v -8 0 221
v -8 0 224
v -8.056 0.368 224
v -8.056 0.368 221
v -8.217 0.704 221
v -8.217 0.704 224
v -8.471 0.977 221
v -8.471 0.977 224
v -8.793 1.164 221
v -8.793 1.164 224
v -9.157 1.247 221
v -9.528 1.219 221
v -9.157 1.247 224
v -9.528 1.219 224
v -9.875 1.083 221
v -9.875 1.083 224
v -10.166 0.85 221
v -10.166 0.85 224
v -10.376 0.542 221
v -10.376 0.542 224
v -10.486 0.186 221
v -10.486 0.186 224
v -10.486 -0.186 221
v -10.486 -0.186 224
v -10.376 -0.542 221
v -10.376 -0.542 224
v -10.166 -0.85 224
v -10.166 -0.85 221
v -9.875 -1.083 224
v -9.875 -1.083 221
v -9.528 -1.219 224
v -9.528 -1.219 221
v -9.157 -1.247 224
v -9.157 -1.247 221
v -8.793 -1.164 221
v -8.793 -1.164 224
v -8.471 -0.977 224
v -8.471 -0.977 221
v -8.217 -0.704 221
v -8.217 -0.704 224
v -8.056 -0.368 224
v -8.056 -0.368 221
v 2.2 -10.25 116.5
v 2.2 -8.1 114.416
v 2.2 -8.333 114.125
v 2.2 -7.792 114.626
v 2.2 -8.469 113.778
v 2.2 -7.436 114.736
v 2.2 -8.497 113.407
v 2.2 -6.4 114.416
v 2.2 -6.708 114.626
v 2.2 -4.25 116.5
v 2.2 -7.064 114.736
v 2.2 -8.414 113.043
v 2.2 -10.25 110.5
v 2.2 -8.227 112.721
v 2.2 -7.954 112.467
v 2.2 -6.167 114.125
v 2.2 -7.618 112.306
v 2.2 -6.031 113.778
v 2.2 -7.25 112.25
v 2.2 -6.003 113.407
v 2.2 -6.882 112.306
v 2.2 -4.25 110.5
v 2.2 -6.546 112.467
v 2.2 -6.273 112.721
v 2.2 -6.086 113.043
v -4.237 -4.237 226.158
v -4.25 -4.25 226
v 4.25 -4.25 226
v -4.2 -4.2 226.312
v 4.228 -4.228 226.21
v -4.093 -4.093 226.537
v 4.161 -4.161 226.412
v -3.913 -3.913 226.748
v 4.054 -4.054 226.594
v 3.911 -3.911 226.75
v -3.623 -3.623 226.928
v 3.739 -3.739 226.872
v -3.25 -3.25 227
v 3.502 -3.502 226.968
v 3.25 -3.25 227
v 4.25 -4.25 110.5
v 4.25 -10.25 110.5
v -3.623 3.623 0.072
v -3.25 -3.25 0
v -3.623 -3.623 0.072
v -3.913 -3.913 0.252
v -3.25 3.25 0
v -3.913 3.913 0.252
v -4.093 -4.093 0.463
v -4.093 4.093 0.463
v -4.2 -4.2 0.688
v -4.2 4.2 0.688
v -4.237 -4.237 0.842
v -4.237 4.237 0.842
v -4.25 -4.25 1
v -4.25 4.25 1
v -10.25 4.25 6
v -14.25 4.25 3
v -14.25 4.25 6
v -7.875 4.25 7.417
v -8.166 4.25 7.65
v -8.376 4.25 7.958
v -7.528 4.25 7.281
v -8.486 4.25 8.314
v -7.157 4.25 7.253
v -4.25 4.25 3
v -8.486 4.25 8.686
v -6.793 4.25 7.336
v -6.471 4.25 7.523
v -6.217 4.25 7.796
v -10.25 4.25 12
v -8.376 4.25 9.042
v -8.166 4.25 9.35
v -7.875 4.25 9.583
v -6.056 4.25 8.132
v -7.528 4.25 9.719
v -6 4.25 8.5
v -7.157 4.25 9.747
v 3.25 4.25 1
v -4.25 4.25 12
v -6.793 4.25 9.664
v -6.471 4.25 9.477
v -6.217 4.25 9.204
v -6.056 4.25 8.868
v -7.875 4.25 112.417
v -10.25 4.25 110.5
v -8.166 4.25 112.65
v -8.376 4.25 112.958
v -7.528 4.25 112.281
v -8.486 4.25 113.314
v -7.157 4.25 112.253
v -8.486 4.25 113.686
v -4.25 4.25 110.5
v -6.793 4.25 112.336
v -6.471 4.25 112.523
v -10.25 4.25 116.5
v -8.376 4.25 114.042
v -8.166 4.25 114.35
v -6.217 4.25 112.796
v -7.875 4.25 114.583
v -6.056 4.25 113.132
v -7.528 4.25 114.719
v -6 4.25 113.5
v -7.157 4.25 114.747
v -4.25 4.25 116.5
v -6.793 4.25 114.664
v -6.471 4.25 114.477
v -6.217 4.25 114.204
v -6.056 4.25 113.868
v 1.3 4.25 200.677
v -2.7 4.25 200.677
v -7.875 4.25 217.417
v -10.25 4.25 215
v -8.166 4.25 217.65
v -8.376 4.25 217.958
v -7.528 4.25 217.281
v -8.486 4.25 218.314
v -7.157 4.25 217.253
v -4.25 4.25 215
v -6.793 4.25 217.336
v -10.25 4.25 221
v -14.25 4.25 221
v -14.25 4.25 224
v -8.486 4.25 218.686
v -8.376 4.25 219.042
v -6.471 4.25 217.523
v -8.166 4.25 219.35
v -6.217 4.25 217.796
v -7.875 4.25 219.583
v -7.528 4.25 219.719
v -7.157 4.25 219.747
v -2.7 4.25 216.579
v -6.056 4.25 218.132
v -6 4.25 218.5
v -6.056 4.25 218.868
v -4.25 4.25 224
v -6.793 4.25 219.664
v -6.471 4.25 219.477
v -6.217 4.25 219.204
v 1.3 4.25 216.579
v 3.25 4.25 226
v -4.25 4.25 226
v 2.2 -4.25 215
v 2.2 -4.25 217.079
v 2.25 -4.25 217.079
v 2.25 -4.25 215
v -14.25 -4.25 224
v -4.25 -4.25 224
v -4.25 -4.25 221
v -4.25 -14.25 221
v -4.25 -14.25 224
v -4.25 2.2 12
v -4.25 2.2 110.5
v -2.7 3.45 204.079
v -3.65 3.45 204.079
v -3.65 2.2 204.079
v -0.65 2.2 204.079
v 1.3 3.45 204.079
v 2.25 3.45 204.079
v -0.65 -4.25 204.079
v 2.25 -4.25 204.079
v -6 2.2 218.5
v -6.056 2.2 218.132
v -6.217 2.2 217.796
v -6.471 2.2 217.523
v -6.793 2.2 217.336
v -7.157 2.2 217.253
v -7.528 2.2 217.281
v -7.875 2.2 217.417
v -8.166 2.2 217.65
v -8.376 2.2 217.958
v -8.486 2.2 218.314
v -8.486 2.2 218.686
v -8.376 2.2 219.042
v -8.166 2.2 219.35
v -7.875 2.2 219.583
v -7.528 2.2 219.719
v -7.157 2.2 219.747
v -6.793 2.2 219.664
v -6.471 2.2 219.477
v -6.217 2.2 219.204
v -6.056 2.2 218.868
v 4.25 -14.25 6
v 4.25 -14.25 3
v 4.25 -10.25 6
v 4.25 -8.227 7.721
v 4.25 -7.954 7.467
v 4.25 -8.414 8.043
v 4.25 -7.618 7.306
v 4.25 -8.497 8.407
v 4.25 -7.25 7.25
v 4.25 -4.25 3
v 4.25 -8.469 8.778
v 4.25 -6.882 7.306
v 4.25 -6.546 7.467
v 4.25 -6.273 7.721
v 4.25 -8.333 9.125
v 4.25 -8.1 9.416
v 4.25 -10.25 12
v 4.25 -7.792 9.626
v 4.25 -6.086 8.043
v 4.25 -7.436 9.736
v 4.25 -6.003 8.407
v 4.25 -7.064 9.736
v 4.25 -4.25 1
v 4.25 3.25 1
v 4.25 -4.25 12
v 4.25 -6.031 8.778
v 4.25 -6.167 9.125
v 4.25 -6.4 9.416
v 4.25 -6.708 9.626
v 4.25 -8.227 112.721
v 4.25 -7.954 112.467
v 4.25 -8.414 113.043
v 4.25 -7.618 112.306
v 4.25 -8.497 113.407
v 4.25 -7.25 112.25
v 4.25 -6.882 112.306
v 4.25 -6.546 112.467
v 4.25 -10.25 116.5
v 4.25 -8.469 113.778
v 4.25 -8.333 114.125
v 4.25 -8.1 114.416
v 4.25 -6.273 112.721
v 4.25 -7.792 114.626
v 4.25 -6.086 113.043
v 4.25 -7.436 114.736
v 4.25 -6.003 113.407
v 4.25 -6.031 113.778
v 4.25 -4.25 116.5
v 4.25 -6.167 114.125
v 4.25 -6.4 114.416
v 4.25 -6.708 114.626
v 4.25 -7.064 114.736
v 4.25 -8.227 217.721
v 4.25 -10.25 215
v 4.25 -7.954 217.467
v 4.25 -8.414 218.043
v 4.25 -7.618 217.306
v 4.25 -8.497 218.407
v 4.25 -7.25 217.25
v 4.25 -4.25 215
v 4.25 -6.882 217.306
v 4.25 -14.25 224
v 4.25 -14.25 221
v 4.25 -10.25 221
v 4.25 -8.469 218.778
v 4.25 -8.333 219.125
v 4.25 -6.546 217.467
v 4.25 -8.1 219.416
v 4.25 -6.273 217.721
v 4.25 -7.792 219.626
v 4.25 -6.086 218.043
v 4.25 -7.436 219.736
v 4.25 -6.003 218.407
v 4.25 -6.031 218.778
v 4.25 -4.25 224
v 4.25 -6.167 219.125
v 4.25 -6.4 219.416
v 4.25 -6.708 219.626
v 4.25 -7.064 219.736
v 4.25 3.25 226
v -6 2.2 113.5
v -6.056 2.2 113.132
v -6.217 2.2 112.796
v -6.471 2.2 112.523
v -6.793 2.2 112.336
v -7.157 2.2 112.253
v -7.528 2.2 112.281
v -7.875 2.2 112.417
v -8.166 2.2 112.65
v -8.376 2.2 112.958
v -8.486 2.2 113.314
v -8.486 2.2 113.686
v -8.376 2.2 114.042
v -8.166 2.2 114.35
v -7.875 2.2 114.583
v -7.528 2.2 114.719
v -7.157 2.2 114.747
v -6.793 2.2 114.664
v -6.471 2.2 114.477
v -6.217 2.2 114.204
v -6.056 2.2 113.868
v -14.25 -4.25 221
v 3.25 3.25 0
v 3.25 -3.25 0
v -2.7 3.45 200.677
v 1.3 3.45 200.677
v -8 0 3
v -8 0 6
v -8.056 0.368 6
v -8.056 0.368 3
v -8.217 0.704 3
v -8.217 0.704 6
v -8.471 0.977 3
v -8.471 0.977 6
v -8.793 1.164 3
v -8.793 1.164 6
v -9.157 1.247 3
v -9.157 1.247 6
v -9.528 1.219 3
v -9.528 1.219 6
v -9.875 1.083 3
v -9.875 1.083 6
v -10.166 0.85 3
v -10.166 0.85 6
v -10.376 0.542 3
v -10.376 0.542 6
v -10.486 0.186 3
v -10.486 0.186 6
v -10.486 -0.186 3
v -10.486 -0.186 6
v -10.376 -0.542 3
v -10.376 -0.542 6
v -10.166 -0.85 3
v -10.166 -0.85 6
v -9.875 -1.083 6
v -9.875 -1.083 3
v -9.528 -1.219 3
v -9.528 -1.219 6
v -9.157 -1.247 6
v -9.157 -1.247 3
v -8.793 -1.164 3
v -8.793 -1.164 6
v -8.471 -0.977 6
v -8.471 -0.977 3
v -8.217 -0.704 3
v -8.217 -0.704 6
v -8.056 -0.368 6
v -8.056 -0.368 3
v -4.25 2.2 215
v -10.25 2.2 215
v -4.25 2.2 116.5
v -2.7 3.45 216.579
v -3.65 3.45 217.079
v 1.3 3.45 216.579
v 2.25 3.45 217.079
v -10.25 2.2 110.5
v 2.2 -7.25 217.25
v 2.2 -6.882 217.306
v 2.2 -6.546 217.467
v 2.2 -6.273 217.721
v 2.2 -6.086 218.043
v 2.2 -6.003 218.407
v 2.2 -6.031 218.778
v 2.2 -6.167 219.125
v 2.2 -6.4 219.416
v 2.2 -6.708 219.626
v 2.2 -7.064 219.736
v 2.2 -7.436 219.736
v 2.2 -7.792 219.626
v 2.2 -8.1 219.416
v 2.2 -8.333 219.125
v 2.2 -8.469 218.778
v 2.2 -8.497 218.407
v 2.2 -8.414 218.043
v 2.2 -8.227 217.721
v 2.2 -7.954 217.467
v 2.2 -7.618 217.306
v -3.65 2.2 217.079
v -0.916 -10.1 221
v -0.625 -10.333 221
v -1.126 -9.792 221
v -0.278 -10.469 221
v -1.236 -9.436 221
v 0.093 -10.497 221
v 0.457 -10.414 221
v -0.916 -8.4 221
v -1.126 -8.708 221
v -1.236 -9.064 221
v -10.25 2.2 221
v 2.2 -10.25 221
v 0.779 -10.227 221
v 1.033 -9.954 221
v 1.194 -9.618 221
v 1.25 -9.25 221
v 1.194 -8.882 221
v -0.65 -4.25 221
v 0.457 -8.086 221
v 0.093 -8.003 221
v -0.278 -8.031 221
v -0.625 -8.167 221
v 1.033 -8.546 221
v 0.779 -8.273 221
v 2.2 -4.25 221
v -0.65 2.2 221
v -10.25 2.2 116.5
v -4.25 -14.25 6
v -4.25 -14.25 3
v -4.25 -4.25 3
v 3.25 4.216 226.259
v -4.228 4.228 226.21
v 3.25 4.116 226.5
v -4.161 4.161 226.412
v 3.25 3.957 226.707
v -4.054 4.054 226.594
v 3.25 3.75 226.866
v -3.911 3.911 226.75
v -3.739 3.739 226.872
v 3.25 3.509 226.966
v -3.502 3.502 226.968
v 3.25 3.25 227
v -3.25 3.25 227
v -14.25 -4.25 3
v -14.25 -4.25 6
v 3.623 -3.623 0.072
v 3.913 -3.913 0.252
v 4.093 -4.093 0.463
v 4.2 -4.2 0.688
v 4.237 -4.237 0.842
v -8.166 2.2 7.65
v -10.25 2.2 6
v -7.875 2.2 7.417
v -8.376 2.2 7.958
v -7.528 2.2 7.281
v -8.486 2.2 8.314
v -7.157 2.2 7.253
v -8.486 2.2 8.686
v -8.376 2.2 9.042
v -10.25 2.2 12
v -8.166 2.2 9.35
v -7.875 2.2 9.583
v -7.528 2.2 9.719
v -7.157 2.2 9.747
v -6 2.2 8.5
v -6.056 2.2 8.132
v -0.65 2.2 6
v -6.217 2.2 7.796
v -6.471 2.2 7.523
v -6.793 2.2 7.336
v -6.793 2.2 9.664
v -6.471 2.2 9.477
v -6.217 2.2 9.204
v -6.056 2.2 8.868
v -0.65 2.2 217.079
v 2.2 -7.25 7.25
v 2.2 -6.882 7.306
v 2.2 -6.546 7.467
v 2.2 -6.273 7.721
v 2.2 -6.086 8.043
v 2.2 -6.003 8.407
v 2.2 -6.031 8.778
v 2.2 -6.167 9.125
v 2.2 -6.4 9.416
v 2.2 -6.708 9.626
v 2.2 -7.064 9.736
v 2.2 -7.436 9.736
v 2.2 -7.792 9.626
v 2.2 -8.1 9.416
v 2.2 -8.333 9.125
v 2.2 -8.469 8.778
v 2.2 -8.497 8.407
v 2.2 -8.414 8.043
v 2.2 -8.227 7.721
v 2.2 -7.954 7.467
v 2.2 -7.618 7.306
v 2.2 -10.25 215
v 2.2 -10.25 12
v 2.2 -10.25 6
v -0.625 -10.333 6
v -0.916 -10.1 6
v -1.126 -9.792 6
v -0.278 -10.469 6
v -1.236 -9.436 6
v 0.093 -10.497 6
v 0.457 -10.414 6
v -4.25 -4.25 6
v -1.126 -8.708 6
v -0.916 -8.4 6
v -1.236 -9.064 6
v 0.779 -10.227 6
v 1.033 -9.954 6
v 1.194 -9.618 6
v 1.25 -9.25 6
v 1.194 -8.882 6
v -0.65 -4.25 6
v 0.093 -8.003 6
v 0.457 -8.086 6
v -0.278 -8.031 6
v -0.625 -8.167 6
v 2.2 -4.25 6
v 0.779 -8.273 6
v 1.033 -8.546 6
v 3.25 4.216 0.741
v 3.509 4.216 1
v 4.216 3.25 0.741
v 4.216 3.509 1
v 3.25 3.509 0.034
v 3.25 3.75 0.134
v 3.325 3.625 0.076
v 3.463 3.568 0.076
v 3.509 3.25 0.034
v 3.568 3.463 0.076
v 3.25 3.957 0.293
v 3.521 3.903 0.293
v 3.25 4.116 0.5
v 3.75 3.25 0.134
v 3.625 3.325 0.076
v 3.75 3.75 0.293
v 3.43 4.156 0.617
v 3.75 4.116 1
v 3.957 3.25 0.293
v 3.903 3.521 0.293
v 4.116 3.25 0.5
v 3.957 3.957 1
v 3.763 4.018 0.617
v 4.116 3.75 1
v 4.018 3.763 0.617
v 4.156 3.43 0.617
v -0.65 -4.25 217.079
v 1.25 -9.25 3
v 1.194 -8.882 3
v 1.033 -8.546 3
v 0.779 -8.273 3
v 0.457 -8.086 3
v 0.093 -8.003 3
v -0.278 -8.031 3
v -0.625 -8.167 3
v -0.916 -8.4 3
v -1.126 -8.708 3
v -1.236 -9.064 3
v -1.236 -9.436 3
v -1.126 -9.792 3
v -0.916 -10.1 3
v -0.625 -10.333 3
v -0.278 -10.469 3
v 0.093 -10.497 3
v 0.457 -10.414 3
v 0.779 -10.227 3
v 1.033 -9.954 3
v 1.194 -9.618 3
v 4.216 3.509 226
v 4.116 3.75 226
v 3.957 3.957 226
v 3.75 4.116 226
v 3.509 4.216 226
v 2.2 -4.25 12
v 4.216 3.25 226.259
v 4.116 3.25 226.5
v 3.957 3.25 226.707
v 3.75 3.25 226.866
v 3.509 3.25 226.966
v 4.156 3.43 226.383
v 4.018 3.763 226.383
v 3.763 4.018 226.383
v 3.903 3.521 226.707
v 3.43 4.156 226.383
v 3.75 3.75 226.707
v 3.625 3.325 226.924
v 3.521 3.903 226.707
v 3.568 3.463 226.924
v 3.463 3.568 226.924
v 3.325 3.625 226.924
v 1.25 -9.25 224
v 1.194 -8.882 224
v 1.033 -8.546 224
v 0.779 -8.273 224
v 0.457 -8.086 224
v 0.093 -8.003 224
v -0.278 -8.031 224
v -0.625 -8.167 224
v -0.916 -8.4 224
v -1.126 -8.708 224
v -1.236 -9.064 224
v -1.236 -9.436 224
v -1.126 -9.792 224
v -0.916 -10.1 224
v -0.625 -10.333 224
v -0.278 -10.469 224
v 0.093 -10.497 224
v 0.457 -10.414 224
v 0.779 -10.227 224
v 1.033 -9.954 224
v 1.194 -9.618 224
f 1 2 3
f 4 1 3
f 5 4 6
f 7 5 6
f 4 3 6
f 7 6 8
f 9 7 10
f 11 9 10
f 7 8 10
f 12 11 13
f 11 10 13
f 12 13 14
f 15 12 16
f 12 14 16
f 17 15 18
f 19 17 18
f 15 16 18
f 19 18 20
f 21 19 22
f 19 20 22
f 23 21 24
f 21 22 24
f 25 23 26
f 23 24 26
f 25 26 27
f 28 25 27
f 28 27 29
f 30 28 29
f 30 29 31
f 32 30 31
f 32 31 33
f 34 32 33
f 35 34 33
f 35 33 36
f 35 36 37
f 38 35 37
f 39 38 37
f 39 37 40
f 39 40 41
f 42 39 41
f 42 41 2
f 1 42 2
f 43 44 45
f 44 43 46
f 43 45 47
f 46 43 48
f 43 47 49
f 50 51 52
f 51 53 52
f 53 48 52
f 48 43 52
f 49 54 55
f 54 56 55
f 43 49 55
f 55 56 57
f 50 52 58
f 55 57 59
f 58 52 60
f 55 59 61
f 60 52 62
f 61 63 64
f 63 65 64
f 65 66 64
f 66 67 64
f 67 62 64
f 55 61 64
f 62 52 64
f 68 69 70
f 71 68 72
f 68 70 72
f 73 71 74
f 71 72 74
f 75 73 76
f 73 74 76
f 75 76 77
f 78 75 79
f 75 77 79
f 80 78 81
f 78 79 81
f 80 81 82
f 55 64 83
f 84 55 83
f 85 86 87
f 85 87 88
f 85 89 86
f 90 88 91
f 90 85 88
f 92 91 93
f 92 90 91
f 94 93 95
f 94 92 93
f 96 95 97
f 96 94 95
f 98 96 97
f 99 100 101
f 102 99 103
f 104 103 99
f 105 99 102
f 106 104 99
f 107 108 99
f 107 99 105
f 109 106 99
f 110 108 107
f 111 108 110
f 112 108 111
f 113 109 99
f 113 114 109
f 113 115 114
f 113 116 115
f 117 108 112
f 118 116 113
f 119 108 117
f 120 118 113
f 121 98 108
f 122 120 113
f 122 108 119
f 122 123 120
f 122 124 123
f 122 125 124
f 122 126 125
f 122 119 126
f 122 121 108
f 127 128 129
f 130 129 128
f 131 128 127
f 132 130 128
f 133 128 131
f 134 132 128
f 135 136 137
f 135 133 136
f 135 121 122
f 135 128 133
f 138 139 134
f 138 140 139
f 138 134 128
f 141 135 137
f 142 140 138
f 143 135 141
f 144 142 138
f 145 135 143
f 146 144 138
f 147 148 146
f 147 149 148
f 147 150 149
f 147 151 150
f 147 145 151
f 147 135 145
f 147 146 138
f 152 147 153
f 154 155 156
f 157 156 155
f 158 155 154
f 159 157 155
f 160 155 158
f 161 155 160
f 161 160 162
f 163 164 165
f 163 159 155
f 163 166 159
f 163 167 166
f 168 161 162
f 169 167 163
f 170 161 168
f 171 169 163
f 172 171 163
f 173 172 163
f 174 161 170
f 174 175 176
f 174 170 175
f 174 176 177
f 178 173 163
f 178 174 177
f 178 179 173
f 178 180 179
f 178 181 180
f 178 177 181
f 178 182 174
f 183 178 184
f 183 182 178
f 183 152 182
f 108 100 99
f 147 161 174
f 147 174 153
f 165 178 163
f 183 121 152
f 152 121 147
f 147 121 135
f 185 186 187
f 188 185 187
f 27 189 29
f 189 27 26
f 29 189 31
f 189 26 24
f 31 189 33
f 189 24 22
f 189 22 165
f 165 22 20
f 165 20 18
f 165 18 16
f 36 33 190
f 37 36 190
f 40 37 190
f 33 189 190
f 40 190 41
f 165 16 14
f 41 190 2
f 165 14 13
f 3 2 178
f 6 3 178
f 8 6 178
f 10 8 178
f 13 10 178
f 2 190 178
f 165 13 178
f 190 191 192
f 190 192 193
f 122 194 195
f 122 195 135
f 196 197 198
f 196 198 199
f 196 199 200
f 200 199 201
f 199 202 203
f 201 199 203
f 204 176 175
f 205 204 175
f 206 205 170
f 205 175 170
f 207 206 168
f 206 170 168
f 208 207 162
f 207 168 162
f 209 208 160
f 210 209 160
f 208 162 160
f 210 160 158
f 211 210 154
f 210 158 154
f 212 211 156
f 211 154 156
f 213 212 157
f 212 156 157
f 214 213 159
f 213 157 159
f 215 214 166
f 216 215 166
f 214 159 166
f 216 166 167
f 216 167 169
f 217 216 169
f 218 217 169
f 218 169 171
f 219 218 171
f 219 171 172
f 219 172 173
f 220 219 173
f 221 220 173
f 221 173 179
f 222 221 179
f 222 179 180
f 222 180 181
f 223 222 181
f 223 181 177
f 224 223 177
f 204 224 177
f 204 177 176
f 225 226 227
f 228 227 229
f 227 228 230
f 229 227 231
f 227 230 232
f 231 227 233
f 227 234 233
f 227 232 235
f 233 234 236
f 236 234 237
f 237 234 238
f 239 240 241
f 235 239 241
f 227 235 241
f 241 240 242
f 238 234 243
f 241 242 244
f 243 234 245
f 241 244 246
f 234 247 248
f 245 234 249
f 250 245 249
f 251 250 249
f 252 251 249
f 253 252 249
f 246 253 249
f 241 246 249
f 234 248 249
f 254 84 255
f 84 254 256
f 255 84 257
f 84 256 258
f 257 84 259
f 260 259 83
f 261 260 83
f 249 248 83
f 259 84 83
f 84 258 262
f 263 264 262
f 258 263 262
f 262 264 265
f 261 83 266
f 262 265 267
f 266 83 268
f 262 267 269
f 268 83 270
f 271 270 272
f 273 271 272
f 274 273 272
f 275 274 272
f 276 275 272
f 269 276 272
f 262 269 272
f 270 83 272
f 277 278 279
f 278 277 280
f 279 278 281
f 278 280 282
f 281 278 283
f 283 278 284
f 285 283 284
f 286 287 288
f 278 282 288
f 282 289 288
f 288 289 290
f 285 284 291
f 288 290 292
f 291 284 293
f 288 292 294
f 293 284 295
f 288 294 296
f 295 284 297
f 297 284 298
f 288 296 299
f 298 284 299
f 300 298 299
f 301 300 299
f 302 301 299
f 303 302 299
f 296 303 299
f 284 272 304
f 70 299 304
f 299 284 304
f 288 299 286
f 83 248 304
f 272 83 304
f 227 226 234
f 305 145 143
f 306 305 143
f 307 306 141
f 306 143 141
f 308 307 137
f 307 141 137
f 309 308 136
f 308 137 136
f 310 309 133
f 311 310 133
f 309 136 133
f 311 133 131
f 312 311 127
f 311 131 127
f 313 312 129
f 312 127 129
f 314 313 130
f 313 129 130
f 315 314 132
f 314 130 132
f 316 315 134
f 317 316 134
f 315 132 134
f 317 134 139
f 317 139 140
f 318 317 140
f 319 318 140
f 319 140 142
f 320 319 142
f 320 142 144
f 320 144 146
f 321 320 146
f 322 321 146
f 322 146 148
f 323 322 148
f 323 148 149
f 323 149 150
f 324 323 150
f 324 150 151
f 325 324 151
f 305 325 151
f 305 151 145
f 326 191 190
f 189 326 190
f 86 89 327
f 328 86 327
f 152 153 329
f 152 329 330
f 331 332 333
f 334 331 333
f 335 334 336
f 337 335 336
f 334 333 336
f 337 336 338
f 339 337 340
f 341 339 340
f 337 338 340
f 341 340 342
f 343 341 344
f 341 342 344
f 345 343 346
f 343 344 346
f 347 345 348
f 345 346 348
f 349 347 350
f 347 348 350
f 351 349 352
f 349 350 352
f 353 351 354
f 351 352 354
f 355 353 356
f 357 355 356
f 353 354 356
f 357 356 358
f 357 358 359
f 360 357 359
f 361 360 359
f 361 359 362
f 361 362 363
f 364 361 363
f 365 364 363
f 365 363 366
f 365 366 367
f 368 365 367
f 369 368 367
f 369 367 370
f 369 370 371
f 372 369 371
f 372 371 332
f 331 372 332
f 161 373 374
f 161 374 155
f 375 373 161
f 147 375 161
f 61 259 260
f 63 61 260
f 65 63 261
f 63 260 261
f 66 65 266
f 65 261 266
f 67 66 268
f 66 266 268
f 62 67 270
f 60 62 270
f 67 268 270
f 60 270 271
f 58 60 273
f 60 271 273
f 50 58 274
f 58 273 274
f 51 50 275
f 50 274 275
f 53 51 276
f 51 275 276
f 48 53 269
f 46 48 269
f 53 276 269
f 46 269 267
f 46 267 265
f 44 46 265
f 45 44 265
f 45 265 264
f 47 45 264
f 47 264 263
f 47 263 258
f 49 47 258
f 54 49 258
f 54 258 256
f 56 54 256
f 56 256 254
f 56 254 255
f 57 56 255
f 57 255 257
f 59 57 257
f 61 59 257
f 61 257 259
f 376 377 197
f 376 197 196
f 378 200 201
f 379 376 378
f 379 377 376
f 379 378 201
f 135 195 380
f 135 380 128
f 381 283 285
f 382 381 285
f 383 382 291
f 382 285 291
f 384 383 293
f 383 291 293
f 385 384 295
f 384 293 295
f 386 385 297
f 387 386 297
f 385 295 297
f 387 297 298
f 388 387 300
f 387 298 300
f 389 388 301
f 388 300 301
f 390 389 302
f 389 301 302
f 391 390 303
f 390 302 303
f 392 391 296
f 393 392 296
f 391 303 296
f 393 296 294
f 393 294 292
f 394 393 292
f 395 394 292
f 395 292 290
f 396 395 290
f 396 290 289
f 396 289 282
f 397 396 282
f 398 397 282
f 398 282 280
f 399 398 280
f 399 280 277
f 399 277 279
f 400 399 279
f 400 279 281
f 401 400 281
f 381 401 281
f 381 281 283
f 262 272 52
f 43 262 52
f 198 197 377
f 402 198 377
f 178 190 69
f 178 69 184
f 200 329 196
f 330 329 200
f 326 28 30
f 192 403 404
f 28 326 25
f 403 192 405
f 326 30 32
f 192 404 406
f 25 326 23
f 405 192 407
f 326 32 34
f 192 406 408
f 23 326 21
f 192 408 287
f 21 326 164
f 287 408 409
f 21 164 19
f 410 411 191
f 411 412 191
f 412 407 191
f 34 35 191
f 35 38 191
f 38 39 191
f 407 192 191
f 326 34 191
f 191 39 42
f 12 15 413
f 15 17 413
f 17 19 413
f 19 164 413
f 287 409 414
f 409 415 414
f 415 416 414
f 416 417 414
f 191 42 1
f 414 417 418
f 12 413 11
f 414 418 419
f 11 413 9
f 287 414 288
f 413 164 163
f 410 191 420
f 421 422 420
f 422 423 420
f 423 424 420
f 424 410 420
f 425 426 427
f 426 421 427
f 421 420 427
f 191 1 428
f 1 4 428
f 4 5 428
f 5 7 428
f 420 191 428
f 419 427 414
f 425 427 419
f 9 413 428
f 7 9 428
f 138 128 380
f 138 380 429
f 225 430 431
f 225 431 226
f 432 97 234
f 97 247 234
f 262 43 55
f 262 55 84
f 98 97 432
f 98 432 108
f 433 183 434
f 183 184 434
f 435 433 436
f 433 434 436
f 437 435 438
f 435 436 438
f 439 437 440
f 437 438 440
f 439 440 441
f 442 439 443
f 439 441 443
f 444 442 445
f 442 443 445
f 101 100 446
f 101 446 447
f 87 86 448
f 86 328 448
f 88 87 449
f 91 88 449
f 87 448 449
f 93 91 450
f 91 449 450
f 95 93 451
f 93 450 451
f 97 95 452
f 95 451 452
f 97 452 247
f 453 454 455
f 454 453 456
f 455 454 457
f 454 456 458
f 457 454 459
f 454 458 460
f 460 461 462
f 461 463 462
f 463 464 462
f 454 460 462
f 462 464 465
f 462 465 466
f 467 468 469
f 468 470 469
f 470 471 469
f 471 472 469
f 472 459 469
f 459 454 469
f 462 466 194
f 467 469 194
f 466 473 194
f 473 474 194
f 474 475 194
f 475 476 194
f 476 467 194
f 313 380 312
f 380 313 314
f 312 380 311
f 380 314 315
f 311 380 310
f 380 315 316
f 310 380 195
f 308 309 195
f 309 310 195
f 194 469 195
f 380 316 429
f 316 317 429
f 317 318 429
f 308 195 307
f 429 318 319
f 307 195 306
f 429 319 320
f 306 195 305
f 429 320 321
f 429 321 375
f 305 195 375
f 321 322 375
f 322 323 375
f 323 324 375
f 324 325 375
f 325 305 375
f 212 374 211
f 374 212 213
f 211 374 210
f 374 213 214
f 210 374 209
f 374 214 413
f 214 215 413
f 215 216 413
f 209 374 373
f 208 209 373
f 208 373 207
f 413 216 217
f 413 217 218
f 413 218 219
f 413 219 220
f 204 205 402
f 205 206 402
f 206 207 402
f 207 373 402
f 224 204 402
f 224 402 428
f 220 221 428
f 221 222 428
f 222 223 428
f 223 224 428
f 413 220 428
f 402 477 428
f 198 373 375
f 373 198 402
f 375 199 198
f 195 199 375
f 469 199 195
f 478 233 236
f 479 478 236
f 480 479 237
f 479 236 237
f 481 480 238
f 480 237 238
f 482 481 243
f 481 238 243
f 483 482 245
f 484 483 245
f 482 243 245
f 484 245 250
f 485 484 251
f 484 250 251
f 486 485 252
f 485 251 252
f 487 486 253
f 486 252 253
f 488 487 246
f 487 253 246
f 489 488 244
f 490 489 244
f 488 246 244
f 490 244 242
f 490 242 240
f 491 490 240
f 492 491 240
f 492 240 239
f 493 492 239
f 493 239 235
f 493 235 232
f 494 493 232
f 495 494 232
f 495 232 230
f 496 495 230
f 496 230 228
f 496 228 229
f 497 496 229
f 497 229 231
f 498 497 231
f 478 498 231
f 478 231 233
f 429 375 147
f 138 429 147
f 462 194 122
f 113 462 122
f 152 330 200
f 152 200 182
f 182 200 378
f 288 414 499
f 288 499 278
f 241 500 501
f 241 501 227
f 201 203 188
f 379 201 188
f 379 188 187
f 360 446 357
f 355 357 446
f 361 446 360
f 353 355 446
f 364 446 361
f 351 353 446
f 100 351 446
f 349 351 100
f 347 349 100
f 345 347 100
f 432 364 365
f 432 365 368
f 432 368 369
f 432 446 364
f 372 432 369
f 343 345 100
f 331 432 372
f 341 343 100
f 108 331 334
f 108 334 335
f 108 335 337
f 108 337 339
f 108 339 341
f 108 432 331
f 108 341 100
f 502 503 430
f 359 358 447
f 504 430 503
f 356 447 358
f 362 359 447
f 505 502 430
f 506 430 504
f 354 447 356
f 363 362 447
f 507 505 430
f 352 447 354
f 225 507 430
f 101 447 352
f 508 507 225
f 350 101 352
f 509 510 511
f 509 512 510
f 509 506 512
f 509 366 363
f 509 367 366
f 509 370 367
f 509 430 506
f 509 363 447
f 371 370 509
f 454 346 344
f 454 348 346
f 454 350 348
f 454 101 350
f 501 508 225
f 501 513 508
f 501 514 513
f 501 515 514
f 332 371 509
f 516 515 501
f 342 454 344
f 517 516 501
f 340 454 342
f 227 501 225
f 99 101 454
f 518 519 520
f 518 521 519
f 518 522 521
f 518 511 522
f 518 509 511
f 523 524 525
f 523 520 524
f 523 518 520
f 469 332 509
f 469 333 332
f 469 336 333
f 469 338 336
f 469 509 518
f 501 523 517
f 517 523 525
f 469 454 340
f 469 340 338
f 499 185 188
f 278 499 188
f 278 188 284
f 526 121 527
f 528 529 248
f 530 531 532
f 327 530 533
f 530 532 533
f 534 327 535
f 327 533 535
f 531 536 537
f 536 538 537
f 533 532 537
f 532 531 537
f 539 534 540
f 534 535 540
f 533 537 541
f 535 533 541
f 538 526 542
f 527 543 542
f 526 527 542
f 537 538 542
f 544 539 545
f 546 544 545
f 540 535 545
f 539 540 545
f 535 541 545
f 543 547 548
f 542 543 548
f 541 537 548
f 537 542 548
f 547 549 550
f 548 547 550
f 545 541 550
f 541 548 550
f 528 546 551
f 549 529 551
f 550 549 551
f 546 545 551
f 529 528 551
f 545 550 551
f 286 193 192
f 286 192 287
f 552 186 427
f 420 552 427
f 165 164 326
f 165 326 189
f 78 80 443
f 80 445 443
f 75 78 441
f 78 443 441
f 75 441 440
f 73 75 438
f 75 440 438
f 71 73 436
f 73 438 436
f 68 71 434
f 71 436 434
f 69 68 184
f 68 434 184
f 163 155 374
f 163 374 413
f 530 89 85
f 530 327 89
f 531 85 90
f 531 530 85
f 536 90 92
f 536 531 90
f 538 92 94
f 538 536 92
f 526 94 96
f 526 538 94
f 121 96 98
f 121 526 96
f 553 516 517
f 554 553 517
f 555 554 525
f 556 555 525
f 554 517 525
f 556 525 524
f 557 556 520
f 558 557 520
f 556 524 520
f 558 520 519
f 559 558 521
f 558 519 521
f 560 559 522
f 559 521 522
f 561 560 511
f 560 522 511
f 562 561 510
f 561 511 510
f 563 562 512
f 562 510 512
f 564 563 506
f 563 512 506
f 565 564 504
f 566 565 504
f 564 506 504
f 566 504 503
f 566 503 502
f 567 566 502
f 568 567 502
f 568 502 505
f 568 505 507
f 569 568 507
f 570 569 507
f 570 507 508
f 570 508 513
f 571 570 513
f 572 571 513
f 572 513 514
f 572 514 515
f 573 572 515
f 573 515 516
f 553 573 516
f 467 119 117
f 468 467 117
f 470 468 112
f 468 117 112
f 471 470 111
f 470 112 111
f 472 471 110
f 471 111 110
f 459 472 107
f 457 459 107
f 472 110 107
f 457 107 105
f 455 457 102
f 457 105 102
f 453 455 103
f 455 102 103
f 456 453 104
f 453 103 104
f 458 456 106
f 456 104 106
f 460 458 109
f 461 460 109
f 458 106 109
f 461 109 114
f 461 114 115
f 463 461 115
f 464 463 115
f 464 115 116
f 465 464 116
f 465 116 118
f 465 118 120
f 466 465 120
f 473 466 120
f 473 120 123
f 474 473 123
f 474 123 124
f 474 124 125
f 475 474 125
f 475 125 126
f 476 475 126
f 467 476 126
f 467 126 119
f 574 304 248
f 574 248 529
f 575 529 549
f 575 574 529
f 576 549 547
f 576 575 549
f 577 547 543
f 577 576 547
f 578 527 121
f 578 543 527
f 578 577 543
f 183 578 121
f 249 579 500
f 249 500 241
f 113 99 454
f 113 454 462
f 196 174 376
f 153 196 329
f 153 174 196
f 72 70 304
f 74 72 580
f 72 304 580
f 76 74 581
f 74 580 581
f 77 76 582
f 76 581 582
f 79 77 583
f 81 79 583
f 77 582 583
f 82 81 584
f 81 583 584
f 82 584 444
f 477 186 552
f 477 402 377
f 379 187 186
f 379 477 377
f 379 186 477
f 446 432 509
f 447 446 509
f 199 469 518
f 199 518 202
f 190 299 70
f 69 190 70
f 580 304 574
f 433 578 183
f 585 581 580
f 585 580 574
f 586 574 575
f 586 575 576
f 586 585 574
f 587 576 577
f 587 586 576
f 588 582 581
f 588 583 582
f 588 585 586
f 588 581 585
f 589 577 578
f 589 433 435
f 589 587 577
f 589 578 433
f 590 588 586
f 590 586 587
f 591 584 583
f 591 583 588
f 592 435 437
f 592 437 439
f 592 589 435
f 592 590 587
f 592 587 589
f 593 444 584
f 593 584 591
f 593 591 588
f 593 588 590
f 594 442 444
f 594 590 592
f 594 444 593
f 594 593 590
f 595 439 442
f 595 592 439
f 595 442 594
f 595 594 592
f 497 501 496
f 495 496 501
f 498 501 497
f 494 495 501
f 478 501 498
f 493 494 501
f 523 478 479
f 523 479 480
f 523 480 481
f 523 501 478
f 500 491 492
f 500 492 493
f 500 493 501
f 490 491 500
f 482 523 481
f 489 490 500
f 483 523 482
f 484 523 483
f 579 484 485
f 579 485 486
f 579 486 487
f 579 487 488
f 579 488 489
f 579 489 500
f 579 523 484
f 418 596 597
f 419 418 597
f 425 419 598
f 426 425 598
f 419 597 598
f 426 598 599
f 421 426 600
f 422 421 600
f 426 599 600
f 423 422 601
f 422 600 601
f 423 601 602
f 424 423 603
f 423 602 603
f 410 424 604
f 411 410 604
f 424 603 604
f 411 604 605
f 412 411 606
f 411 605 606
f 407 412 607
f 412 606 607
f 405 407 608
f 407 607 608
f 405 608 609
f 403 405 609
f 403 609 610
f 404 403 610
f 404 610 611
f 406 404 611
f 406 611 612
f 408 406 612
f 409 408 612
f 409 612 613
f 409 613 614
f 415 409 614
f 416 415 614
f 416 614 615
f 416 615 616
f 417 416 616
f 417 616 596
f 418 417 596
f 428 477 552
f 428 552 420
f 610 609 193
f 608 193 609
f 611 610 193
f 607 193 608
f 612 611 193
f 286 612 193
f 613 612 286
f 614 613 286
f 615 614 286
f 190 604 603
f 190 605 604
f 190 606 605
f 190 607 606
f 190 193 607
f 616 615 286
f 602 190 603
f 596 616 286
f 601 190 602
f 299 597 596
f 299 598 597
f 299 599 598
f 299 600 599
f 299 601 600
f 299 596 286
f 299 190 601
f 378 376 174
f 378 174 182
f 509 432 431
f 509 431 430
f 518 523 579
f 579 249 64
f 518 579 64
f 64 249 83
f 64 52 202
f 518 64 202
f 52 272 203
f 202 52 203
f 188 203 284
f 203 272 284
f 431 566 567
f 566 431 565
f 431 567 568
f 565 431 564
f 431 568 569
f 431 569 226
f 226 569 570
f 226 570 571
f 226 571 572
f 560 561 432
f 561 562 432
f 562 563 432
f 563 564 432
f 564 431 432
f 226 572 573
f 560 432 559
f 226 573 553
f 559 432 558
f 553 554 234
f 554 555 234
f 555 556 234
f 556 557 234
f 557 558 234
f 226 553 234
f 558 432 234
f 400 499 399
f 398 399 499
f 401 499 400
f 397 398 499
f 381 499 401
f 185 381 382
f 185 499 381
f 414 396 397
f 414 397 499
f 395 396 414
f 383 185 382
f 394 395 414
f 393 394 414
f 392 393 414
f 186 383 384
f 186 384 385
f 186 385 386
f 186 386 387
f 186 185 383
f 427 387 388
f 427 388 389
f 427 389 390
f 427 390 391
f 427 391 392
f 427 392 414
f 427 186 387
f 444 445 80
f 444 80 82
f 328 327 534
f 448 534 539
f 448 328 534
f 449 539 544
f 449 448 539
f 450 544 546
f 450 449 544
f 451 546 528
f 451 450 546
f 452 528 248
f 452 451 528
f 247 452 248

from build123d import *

# Parameters (mm, degrees)
ESBO_O1_W                = 8.5
ESBO_O1_H                = 8.5
RESSALTO_EXTRUS_O1_DEPTH = 227
FILETE1_R                = 1
FILETE2_R                = 1
FILETE3_R                = 1
ESBO_O2_W                = 215
ESBO_O2_H                = 6.45
CORTE_EXTRUS_O2_DEPTH    = 3.6
ESBO_O3_W                = 3
ESBO_O3_H                = 8.5
RESSALTO_EXTRUS_O3_DEPTH = 10
ESBO_O4_W                = 8.5
ESBO_O4_H                = 3
RESSALTO_EXTRUS_O4_DEPTH = 10
ESBO_O5_W                = 6
ESBO_O5_H                = 2.05
RESSALTO_EXTRUS_O5_DEPTH = 6
ESBO_O6_W                = 2.05
ESBO_O6_H                = 6
RESSALTO_EXTRUS_O6_DEPTH = 6
ESBO_O6_2_W              = 2.05
ESBO_O6_2_H              = 6
RESSALTO_EXTRUS_O7_DEPTH = 6
ESBO_O7_R                = 1.25
CORTE_EXTRUS_O3_DEPTH    = 250
ESBO_O8_R                = 1.25
CORTE_EXTRUS_O4_DEPTH    = 5
ESBO_O9_R                = 1.25
CORTE_EXTRUS_O5_DEPTH    = 5
ESBO_O11_W               = 2.9
ESBO_O11_H               = 13
CORTE_EXTRUS_O6_DEPTH    = 7.7
ESBO_O15_W               = 13
ESBO_O15_H               = 7.7
CORTE_EXTRUS_O10_DEPTH   = 5.9
ESBO_O16_W               = 4
ESBO_O16_H               = 12.5
CORTE_EXTRUS_O12_DEPTH   = 5.9
ESBO_O17_W               = 4
ESBO_O17_H               = 3.401907962
CORTE_EXTRUS_O14_DEPTH   = 0.8


with BuildPart() as part:
    # Esboço1 → Ressalto-extrusão1 (new body)
    with BuildSketch(Plane.XY):
        Rectangle(ESBO_O1_W, ESBO_O1_H)
    extrude(amount=RESSALTO_EXTRUS_O1_DEPTH)

    # Filete1
    filete1_edges = [part.edges().sort_by_distance(p)[0] for p in [
        (4.25, 4.25, 113.5),
    ]]
    fillet(filete1_edges, radius=FILETE1_R)

    # Filete2
    filete2_edges = [part.edges().sort_by_distance(p)[0] for p in [
        (4.25, -0.5, 227),
        (-0.5, 4.25, 227),
        (3.957106781, 3.957106781, 227),
        (-4.25, 0, 227),
        (0, -4.25, 227),
    ]]
    fillet(filete2_edges, radius=FILETE2_R)

    # Filete3
    filete3_edges = [part.edges().sort_by_distance(p)[0] for p in [
        (-0.5, 4.25, 0),
        (3.957106781, 3.957106781, 0),
        (4.25, -0.5, 0),
        (0, -4.25, 0),
        (-4.25, 0, 0),
    ]]
    fillet(filete3_edges, radius=FILETE3_R)

    # Esboço2 → Corte-extrusão2 (cut)
    with BuildSketch(Plane.ZY.offset(4.25)):
        with Locations((113.5, -1.025)):
            Rectangle(ESBO_O2_W, ESBO_O2_H)
    extrude(amount=-CORTE_EXTRUS_O2_DEPTH, mode=Mode.SUBTRACT)

    # Esboço3 → Ressalto-extrusão3 (add)
    with BuildSketch(Plane.ZY.offset(4.25)):
        with Locations((4.5, 0)):
            Rectangle(ESBO_O3_W, ESBO_O3_H)
        with Locations((222.5, 0)):
            Rectangle(ESBO_O3_W, ESBO_O3_H)
    extrude(amount=RESSALTO_EXTRUS_O3_DEPTH)

    # Esboço4 → Ressalto-extrusão4 (add)
    with BuildSketch(Plane.XZ.offset(4.25)):
        with Locations((0, 222.5)):
            Rectangle(ESBO_O4_W, ESBO_O4_H)
        with Locations((0, 4.5)):
            Rectangle(ESBO_O4_W, ESBO_O4_H)
    extrude(amount=RESSALTO_EXTRUS_O4_DEPTH)

    # Esboço5 → Ressalto-extrusão5 (add)
    with BuildSketch(Plane.ZY.offset(4.25)):
        with Locations((9, 3.225)):
            Rectangle(ESBO_O5_W, ESBO_O5_H)
        with Locations((218, 3.225)):
            Rectangle(ESBO_O5_W, ESBO_O5_H)
        with Locations((113.5, 3.225)):
            Rectangle(ESBO_O5_W, ESBO_O5_H)
    extrude(amount=RESSALTO_EXTRUS_O5_DEPTH)

    # Esboço6 → Ressalto-extrusão6 (add)
    with BuildSketch(Plane.XZ.offset(4.25)):
        with Locations((3.225, 9)):
            Rectangle(ESBO_O6_W, ESBO_O6_H)
        Polygon((4.25, 113.5), (4.25, 116.5), (2.2, 116.5), (2.2, 110.5), (4.25, 110.5), align=None)
        with Locations((3.225, 218)):
            Rectangle(ESBO_O6_W, ESBO_O6_H)
    extrude(amount=RESSALTO_EXTRUS_O6_DEPTH)

    # Esboço6<2> → Ressalto-extrusão7 (add)
    with BuildSketch(Plane.XZ.offset(4.25)):
        with Locations((3.225, 9)):
            Rectangle(ESBO_O6_2_W, ESBO_O6_2_H)
        Polygon((4.25, 113.5), (4.25, 116.5), (2.2, 116.5), (2.2, 110.5), (4.25, 110.5), align=None)
        with Locations((3.225, 218)):
            Rectangle(ESBO_O6_2_W, ESBO_O6_2_H)
    extrude(amount=RESSALTO_EXTRUS_O7_DEPTH)

    # Esboço7 → Corte-extrusão3 (cut)
    with BuildSketch(Plane.XY.offset(224)):
        with Locations((-9.25, 0)):
            Circle(ESBO_O7_R)
        with Locations((0, -9.25)):
            Circle(ESBO_O7_R)
    extrude(amount=-CORTE_EXTRUS_O3_DEPTH, mode=Mode.SUBTRACT)

    # Esboço8 → Corte-extrusão4 (cut)
    with BuildSketch(Plane(origin=(4.25, 0, 0), x_dir=(0, 0, -1), z_dir=(1, 0, 0))):
        with Locations((-218.5, -7.25)):
            Circle(ESBO_O8_R)
        with Locations((-113.5, -7.25)):
            Circle(ESBO_O8_R)
        with Locations((-8.5, -7.25)):
            Circle(ESBO_O8_R)
    extrude(amount=-CORTE_EXTRUS_O4_DEPTH, mode=Mode.SUBTRACT)

    # Esboço9 → Corte-extrusão5 (cut)
    with BuildSketch(Plane(origin=(0, 4.25, 0), x_dir=(1, 0, 0), z_dir=(0, 1, 0))):
        with Locations((-7.25, -218.5)):
            Circle(ESBO_O9_R)
        with Locations((-7.25, -113.5)):
            Circle(ESBO_O9_R)
        with Locations((-7.25, -8.5)):
            Circle(ESBO_O9_R)
    extrude(amount=-CORTE_EXTRUS_O5_DEPTH, mode=Mode.SUBTRACT)

    # Esboço11 → Corte-extrusão6 (cut)
    with BuildSketch(Plane.XZ.offset(4.25)):
        with Locations((0.8, 210.578920039)):
            Rectangle(ESBO_O11_W, ESBO_O11_H)
    extrude(amount=-CORTE_EXTRUS_O6_DEPTH, mode=Mode.SUBTRACT)

    # Esboço15 → Corte-extrusão10 (cut)
    with BuildSketch(Plane.ZY.offset(-2.25)):
        with Locations((210.578920039, -0.4)):
            Rectangle(ESBO_O15_W, ESBO_O15_H)
    extrude(amount=CORTE_EXTRUS_O10_DEPTH, mode=Mode.SUBTRACT)

    # Esboço16 → Corte-extrusão12 (cut)
    with BuildSketch(Plane.XZ.offset(-3.45)):
        with Locations((-0.7, 210.328920039)):
            Rectangle(ESBO_O16_W, ESBO_O16_H)
    extrude(amount=-CORTE_EXTRUS_O12_DEPTH, mode=Mode.SUBTRACT)

    # Esboço17 → Corte-extrusão14 (cut)
    with BuildSketch(Plane(origin=(0, 4.25, 0), x_dir=(1, 0, 0), z_dir=(0, 1, 0))):
        with Locations((-0.7, -202.377966058)):
            Rectangle(ESBO_O17_W, ESBO_O17_H)
    extrude(amount=-CORTE_EXTRUS_O14_DEPTH, mode=Mode.SUBTRACT)


solid = part.part
